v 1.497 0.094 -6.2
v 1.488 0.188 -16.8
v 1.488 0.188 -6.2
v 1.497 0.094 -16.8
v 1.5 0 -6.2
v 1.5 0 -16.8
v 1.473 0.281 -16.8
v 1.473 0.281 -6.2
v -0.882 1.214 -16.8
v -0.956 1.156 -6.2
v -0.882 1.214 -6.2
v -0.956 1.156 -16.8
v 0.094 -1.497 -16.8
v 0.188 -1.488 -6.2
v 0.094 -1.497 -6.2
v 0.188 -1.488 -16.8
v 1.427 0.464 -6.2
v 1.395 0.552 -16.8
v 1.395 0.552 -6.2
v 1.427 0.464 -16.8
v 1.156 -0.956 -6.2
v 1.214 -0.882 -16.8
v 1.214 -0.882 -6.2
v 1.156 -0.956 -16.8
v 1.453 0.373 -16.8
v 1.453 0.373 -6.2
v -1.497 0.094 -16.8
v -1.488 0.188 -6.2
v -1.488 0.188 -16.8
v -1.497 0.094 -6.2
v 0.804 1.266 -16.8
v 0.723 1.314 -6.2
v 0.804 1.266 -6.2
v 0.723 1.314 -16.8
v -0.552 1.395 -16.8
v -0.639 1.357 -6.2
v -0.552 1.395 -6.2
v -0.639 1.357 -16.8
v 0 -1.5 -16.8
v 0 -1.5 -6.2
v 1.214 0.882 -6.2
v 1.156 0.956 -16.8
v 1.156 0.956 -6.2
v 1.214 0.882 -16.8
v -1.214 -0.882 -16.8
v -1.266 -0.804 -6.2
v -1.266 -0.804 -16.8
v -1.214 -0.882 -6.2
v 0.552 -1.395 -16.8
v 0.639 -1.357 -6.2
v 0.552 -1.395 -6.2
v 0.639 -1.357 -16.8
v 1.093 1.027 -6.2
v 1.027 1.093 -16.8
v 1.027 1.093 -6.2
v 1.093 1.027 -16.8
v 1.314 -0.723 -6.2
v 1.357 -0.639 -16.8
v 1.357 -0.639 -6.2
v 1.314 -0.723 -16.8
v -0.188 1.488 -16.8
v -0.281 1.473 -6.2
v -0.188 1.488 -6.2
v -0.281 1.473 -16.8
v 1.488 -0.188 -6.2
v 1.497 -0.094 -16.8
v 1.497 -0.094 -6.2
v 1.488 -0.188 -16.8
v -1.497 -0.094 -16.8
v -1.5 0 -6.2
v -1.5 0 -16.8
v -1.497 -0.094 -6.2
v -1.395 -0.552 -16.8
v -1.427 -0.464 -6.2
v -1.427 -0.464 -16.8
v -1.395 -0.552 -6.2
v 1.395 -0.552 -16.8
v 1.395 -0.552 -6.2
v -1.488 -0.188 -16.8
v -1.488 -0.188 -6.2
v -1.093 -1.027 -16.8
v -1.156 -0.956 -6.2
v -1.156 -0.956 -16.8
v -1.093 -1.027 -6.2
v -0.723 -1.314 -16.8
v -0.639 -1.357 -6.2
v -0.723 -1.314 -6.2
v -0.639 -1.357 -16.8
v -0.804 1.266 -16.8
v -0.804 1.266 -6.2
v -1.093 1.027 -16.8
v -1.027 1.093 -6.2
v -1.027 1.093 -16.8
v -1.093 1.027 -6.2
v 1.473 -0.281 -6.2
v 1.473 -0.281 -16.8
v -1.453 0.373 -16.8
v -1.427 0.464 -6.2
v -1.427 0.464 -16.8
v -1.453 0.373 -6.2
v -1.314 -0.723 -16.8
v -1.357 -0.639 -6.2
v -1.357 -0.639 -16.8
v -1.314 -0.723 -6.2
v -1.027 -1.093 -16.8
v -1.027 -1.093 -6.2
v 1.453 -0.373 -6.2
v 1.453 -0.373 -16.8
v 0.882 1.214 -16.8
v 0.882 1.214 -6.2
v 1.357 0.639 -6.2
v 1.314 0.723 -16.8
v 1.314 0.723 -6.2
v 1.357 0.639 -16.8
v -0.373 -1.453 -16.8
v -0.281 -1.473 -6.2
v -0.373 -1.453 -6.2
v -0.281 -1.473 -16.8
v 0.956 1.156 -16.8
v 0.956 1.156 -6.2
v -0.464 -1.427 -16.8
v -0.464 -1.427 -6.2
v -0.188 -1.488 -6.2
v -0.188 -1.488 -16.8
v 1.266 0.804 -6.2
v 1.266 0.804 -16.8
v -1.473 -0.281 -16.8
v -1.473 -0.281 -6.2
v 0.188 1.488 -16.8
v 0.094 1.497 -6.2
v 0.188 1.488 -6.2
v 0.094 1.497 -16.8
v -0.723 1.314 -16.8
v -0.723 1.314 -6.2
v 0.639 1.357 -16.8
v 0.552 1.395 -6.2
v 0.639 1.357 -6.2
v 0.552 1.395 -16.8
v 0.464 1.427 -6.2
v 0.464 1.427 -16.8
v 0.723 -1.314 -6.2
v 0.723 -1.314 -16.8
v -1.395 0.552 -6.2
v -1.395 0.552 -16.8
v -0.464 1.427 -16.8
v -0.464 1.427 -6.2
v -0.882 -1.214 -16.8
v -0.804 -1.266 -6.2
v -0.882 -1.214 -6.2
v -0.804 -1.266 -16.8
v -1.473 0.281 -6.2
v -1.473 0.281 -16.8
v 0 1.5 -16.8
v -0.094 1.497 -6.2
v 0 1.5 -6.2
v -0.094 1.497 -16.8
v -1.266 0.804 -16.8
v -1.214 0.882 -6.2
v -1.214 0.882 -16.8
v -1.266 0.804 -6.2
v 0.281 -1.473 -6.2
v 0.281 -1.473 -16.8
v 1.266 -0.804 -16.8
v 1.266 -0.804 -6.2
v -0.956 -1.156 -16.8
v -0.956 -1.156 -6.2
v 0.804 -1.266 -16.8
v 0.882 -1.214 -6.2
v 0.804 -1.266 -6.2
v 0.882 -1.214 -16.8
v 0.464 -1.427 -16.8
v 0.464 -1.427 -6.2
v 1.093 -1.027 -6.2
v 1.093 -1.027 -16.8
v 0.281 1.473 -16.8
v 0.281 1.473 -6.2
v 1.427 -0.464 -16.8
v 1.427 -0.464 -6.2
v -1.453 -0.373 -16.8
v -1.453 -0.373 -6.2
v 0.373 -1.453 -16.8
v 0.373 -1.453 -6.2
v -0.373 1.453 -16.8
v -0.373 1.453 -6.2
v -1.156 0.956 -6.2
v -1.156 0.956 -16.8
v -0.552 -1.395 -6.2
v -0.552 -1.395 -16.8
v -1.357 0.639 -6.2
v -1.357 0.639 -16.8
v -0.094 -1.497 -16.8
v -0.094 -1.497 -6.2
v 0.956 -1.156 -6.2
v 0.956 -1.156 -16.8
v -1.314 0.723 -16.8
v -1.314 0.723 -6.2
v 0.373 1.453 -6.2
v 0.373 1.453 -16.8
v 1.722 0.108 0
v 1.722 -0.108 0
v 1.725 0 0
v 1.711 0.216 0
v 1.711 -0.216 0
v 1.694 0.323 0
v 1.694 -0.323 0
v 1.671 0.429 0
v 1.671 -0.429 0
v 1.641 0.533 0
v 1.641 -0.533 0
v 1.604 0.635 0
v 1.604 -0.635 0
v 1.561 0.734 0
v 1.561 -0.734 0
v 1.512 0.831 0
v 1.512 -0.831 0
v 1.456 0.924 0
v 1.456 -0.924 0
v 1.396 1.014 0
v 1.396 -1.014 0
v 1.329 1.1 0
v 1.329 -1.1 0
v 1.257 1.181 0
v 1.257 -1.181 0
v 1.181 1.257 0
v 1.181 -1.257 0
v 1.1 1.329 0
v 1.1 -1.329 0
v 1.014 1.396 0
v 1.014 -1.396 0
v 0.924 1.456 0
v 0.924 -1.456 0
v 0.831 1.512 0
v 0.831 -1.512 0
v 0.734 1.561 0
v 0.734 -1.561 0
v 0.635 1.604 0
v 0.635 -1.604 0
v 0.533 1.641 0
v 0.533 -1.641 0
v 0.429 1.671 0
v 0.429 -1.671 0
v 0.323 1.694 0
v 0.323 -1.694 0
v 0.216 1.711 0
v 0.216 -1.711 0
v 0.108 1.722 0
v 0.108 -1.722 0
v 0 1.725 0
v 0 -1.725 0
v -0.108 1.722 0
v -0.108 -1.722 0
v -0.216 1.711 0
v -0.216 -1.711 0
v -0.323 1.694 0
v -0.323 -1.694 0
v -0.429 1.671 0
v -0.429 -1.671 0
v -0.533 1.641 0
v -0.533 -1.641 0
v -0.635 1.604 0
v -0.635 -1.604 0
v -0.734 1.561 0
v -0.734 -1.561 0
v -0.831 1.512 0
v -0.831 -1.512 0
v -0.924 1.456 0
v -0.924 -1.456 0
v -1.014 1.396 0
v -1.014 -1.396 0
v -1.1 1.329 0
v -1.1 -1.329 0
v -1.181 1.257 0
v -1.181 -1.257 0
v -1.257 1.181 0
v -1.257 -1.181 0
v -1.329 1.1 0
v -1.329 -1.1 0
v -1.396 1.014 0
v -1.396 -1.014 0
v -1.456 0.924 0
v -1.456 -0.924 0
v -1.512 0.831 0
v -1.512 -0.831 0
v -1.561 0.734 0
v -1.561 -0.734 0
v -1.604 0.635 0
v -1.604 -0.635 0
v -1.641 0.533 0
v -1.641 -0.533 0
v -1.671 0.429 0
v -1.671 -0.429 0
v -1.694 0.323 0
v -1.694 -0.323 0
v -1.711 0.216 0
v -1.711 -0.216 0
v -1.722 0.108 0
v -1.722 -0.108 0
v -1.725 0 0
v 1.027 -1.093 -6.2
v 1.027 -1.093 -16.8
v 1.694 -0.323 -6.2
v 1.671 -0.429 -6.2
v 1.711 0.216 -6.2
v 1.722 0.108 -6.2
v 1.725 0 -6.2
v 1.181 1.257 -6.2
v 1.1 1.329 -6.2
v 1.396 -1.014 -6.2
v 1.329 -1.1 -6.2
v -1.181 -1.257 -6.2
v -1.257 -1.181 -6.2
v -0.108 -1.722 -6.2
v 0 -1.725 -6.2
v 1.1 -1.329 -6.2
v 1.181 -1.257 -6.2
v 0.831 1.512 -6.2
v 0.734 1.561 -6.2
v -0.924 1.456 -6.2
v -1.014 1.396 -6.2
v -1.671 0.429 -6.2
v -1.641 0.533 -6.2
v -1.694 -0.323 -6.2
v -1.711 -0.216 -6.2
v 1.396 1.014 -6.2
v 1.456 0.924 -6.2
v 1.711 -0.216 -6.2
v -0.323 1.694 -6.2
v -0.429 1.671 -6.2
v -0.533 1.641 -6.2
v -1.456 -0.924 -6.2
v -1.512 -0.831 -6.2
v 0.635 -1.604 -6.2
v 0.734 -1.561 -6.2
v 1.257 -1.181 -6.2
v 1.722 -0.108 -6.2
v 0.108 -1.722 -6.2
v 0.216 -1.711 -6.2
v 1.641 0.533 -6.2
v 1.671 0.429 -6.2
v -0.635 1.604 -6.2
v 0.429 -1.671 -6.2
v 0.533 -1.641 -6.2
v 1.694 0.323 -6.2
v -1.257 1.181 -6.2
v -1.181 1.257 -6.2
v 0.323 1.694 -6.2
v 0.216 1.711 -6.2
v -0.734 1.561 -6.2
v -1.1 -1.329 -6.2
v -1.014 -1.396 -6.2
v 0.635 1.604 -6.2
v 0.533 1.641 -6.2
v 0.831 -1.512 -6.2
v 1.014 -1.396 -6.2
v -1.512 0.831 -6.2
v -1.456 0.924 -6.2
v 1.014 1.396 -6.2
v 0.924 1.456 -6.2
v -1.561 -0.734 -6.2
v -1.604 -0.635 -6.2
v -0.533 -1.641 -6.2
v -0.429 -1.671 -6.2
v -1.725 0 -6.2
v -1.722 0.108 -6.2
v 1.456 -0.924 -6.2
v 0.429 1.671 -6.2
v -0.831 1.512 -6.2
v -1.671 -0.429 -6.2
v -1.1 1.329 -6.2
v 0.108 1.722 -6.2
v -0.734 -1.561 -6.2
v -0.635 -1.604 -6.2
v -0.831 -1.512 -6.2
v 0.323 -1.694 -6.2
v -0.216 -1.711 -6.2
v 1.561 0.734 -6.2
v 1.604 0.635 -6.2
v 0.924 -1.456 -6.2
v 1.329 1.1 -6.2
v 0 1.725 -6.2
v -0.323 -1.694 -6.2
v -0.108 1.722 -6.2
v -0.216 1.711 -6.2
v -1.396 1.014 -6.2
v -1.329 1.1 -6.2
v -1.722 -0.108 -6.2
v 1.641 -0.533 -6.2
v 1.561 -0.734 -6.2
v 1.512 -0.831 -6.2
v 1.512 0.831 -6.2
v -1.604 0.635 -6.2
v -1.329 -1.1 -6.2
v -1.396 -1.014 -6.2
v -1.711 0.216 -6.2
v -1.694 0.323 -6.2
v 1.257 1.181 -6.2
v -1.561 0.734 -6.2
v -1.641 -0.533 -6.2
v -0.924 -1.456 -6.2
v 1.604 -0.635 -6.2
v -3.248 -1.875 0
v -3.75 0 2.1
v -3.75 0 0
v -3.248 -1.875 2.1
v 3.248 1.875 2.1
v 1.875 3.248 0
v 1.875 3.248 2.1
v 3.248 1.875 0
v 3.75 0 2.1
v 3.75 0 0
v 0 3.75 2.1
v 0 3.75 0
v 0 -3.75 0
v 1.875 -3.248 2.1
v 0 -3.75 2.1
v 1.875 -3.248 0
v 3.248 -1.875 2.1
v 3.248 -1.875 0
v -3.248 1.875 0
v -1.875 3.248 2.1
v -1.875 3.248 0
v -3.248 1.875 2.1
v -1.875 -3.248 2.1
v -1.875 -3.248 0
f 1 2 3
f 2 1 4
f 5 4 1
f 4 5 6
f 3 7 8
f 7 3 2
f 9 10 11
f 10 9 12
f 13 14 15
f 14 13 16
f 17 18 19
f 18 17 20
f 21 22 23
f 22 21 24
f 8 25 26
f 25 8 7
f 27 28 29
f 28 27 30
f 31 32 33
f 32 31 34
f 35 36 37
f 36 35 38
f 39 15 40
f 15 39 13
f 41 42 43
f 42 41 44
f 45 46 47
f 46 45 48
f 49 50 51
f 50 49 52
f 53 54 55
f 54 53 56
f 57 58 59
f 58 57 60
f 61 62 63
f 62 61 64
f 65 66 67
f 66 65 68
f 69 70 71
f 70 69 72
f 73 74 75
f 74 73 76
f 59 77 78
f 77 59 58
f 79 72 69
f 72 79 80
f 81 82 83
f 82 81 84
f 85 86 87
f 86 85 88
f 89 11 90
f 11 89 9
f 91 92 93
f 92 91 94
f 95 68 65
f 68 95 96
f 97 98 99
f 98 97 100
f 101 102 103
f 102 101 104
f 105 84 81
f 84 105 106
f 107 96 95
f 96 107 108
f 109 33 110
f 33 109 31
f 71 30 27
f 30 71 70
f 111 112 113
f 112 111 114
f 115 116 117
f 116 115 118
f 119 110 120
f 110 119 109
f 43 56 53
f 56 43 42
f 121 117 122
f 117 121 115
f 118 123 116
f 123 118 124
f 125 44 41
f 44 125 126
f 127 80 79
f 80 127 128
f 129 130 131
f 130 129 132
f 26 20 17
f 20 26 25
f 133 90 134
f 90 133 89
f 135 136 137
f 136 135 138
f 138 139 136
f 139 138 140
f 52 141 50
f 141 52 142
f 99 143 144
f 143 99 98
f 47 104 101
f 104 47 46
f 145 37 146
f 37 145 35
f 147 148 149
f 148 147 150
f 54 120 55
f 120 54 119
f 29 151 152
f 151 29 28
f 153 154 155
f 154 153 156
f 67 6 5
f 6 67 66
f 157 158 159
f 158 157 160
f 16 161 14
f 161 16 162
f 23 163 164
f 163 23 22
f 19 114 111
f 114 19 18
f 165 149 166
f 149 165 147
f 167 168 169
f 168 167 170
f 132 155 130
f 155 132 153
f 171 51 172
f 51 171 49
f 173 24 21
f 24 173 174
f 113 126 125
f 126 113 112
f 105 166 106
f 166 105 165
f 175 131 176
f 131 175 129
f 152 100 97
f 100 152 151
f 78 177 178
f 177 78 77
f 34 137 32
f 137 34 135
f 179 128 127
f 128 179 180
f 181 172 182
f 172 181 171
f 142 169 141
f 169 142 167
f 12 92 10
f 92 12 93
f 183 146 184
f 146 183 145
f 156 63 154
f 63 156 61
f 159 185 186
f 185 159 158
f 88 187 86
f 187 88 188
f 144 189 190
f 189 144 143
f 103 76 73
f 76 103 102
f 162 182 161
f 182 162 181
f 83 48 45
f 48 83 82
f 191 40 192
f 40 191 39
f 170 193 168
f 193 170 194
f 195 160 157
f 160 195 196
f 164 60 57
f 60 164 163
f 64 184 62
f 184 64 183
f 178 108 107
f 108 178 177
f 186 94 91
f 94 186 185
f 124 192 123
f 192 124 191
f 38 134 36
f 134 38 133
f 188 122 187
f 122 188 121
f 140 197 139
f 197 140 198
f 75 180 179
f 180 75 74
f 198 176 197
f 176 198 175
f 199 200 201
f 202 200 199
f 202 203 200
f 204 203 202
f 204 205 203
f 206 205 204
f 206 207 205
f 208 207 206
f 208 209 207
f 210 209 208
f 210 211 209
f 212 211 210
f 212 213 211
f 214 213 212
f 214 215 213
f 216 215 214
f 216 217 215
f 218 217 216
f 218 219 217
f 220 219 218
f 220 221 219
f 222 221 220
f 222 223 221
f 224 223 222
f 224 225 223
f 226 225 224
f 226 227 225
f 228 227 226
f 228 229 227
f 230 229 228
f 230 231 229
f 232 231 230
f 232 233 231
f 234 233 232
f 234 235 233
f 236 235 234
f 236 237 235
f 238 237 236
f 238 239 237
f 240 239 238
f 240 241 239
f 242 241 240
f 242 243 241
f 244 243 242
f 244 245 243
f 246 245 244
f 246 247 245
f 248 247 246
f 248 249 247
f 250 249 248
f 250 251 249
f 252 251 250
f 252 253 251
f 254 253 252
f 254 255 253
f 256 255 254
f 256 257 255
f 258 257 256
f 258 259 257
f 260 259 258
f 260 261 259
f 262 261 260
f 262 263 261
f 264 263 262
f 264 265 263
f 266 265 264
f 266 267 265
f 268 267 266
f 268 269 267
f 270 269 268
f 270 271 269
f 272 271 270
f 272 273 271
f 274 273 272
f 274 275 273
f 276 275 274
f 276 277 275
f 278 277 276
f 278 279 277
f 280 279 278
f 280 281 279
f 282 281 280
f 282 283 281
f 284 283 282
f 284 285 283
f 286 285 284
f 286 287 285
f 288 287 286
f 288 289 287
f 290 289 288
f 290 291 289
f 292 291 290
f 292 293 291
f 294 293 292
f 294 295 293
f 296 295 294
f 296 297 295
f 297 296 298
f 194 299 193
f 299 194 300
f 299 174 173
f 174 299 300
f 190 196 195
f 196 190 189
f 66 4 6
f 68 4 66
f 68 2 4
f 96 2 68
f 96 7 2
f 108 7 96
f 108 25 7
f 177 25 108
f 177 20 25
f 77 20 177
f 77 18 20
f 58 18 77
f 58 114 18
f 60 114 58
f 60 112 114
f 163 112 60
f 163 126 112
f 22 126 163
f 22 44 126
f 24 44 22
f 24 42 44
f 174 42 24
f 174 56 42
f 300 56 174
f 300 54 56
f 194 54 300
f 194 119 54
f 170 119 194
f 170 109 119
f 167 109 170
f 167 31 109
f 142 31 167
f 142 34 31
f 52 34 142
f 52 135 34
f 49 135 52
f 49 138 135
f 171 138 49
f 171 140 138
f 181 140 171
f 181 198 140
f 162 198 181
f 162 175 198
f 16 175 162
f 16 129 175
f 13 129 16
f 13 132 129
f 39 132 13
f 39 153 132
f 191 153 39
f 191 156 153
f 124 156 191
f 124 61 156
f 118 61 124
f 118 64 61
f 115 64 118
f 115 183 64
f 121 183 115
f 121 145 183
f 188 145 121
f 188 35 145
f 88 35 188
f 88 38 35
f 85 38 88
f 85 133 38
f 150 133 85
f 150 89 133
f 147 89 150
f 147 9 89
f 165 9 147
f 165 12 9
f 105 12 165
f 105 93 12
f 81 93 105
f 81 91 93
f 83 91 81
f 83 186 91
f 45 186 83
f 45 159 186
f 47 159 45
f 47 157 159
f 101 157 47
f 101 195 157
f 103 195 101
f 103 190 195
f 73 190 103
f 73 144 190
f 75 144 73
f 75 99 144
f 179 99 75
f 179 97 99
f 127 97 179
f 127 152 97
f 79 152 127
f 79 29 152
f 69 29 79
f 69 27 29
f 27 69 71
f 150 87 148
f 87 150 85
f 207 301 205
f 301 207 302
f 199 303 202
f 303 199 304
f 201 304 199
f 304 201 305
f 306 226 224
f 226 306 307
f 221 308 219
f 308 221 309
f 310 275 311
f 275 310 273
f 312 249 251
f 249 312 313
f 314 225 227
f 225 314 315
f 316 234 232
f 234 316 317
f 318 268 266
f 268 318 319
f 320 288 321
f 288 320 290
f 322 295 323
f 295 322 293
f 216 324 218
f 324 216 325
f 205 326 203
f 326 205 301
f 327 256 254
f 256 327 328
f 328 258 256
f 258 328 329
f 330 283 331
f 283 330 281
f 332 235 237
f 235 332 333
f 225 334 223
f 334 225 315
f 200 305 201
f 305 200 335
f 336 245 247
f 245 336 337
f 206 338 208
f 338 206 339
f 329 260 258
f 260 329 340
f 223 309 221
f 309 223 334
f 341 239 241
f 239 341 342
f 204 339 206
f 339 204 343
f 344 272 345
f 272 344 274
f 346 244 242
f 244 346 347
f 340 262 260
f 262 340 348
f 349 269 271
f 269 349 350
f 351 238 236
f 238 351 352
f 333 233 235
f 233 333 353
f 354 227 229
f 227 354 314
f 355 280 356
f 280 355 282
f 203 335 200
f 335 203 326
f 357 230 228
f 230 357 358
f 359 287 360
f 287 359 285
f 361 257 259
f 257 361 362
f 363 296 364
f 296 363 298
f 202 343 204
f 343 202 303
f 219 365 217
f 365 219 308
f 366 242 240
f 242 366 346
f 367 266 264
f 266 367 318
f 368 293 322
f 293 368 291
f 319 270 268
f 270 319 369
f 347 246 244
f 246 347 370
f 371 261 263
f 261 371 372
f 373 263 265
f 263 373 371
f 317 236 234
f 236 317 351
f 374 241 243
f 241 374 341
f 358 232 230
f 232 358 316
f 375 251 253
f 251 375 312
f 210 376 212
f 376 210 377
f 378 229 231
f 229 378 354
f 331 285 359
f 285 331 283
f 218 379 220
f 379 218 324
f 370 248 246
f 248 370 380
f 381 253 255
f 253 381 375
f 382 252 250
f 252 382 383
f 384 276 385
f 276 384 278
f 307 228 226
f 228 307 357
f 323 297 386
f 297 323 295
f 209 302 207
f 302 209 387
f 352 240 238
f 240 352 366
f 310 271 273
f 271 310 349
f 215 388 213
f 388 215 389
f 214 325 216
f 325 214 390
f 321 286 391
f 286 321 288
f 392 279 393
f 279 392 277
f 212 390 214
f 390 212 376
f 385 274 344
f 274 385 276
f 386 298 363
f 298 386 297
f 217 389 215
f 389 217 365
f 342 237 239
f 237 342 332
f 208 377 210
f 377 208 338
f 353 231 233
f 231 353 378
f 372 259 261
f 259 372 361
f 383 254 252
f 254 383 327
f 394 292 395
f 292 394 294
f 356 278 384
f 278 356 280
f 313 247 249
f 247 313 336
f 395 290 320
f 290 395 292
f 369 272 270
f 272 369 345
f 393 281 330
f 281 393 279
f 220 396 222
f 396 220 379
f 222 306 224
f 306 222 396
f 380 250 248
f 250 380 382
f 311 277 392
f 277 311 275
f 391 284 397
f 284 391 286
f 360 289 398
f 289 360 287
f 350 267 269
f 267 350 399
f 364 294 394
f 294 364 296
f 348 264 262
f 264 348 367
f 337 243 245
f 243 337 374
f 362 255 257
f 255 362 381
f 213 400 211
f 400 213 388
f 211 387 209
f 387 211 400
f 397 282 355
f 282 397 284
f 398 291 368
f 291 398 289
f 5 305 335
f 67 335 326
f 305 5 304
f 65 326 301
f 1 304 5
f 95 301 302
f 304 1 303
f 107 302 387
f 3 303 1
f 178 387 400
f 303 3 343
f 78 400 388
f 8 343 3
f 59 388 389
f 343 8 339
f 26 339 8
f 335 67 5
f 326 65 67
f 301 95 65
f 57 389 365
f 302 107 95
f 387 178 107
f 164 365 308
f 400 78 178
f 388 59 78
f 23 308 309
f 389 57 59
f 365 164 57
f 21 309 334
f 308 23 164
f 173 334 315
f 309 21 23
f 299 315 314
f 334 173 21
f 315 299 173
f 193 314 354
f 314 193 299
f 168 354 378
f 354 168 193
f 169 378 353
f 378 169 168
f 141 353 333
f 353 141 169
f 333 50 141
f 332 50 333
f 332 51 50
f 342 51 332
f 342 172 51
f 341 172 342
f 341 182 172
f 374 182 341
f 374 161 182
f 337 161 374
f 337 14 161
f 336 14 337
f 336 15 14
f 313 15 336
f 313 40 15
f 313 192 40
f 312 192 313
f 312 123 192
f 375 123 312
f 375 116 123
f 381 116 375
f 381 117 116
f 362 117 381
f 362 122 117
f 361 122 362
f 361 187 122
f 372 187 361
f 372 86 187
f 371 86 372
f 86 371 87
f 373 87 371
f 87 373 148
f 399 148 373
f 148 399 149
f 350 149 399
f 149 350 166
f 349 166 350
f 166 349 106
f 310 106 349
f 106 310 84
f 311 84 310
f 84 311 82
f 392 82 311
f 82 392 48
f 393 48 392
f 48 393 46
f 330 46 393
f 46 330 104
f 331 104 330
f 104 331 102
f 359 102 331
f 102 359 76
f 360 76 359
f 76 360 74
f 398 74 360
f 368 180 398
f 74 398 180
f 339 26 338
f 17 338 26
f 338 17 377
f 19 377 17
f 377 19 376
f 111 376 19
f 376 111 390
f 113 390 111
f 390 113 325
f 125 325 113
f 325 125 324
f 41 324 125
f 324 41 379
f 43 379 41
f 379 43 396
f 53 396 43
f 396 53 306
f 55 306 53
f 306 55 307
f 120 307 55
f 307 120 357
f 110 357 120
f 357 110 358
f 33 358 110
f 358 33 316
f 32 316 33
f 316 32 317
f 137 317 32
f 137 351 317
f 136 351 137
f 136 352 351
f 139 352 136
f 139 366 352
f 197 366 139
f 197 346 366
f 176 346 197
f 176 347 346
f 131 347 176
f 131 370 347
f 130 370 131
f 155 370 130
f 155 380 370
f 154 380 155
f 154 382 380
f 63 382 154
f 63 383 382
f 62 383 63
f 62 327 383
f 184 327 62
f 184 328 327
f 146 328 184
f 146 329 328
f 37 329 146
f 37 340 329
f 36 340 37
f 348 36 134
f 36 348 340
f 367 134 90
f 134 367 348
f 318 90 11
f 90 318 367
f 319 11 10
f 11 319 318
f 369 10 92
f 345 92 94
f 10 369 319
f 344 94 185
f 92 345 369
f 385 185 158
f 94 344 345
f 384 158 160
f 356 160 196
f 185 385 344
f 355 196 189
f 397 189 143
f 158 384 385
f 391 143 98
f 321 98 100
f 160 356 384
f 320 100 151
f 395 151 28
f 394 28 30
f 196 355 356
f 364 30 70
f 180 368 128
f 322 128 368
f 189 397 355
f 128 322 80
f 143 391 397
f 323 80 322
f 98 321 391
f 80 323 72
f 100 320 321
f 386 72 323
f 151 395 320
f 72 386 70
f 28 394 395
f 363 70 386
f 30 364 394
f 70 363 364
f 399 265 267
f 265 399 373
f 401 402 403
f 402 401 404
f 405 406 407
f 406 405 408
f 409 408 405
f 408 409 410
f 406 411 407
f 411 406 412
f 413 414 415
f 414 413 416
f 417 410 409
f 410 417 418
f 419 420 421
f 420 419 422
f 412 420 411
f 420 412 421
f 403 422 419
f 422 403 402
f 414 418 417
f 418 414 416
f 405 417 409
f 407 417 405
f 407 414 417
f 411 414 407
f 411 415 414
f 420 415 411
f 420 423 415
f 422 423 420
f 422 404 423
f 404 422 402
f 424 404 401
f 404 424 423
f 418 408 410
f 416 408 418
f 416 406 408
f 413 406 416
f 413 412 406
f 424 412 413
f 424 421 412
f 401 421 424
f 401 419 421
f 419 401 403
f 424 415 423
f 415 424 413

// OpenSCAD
//This is modelling a motor screw being used as a bolt, and it's got a thicker bit so that it can slide through one side of the grip and then grab onto the other

function MotorScrewBoltOuterDiameter(3dPrinterTolerance=.4) = 2.65 + 3dPrinterTolerance*2;
function MotorScrewBoltDiameter(3dPrinterTolerance=.4)= 2.2 + 3dPrinterTolerance*2;
function MotorScrewBoltLength(3dPrinterTolerance=.4)= 16.4 + 3dPrinterTolerance;
function MotorScrewBoltHeadDiameter(3dPrinterTolerance=.4)= 6.7 + 3dPrinterTolerance*2;
function MotorScrewBoltHeadHeight(3dPrinterTolerance=.4)= 1.7 + 3dPrinterTolerance;

//err on the side of larger tolerances for bolts

module MotorScrewBolt(3dPrinterTolerance=.4, PlasticWidth=4.2)
{
	union()
	{
		translate([0,0,-MotorScrewBoltLength(3dPrinterTolerance)])
		{
			union()
			{
				cylinder(h=MotorScrewBoltLength(3dPrinterTolerance),r=MotorScrewBoltDiameter(3dPrinterTolerance)/2, $fn=100);
				translate([0,0,MotorScrewBoltLength(3dPrinterTolerance)-(PlasticWidth+2)])
				{
					cylinder(h=PlasticWidth+2, r=MotorScrewBoltOuterDiameter(3dPrinterTolerance)/2, $fn=100);
				}
			}
		}
		cylinder(MotorScrewBoltHeadHeight(3dPrinterTolerance), MotorScrewBoltHeadDiameter(3dPrinterTolerance)/2,MotorScrewBoltHeadDiameter(3dPrinterTolerance)/2);
	}
}



MotorScrewBolt(.4,4.2);
